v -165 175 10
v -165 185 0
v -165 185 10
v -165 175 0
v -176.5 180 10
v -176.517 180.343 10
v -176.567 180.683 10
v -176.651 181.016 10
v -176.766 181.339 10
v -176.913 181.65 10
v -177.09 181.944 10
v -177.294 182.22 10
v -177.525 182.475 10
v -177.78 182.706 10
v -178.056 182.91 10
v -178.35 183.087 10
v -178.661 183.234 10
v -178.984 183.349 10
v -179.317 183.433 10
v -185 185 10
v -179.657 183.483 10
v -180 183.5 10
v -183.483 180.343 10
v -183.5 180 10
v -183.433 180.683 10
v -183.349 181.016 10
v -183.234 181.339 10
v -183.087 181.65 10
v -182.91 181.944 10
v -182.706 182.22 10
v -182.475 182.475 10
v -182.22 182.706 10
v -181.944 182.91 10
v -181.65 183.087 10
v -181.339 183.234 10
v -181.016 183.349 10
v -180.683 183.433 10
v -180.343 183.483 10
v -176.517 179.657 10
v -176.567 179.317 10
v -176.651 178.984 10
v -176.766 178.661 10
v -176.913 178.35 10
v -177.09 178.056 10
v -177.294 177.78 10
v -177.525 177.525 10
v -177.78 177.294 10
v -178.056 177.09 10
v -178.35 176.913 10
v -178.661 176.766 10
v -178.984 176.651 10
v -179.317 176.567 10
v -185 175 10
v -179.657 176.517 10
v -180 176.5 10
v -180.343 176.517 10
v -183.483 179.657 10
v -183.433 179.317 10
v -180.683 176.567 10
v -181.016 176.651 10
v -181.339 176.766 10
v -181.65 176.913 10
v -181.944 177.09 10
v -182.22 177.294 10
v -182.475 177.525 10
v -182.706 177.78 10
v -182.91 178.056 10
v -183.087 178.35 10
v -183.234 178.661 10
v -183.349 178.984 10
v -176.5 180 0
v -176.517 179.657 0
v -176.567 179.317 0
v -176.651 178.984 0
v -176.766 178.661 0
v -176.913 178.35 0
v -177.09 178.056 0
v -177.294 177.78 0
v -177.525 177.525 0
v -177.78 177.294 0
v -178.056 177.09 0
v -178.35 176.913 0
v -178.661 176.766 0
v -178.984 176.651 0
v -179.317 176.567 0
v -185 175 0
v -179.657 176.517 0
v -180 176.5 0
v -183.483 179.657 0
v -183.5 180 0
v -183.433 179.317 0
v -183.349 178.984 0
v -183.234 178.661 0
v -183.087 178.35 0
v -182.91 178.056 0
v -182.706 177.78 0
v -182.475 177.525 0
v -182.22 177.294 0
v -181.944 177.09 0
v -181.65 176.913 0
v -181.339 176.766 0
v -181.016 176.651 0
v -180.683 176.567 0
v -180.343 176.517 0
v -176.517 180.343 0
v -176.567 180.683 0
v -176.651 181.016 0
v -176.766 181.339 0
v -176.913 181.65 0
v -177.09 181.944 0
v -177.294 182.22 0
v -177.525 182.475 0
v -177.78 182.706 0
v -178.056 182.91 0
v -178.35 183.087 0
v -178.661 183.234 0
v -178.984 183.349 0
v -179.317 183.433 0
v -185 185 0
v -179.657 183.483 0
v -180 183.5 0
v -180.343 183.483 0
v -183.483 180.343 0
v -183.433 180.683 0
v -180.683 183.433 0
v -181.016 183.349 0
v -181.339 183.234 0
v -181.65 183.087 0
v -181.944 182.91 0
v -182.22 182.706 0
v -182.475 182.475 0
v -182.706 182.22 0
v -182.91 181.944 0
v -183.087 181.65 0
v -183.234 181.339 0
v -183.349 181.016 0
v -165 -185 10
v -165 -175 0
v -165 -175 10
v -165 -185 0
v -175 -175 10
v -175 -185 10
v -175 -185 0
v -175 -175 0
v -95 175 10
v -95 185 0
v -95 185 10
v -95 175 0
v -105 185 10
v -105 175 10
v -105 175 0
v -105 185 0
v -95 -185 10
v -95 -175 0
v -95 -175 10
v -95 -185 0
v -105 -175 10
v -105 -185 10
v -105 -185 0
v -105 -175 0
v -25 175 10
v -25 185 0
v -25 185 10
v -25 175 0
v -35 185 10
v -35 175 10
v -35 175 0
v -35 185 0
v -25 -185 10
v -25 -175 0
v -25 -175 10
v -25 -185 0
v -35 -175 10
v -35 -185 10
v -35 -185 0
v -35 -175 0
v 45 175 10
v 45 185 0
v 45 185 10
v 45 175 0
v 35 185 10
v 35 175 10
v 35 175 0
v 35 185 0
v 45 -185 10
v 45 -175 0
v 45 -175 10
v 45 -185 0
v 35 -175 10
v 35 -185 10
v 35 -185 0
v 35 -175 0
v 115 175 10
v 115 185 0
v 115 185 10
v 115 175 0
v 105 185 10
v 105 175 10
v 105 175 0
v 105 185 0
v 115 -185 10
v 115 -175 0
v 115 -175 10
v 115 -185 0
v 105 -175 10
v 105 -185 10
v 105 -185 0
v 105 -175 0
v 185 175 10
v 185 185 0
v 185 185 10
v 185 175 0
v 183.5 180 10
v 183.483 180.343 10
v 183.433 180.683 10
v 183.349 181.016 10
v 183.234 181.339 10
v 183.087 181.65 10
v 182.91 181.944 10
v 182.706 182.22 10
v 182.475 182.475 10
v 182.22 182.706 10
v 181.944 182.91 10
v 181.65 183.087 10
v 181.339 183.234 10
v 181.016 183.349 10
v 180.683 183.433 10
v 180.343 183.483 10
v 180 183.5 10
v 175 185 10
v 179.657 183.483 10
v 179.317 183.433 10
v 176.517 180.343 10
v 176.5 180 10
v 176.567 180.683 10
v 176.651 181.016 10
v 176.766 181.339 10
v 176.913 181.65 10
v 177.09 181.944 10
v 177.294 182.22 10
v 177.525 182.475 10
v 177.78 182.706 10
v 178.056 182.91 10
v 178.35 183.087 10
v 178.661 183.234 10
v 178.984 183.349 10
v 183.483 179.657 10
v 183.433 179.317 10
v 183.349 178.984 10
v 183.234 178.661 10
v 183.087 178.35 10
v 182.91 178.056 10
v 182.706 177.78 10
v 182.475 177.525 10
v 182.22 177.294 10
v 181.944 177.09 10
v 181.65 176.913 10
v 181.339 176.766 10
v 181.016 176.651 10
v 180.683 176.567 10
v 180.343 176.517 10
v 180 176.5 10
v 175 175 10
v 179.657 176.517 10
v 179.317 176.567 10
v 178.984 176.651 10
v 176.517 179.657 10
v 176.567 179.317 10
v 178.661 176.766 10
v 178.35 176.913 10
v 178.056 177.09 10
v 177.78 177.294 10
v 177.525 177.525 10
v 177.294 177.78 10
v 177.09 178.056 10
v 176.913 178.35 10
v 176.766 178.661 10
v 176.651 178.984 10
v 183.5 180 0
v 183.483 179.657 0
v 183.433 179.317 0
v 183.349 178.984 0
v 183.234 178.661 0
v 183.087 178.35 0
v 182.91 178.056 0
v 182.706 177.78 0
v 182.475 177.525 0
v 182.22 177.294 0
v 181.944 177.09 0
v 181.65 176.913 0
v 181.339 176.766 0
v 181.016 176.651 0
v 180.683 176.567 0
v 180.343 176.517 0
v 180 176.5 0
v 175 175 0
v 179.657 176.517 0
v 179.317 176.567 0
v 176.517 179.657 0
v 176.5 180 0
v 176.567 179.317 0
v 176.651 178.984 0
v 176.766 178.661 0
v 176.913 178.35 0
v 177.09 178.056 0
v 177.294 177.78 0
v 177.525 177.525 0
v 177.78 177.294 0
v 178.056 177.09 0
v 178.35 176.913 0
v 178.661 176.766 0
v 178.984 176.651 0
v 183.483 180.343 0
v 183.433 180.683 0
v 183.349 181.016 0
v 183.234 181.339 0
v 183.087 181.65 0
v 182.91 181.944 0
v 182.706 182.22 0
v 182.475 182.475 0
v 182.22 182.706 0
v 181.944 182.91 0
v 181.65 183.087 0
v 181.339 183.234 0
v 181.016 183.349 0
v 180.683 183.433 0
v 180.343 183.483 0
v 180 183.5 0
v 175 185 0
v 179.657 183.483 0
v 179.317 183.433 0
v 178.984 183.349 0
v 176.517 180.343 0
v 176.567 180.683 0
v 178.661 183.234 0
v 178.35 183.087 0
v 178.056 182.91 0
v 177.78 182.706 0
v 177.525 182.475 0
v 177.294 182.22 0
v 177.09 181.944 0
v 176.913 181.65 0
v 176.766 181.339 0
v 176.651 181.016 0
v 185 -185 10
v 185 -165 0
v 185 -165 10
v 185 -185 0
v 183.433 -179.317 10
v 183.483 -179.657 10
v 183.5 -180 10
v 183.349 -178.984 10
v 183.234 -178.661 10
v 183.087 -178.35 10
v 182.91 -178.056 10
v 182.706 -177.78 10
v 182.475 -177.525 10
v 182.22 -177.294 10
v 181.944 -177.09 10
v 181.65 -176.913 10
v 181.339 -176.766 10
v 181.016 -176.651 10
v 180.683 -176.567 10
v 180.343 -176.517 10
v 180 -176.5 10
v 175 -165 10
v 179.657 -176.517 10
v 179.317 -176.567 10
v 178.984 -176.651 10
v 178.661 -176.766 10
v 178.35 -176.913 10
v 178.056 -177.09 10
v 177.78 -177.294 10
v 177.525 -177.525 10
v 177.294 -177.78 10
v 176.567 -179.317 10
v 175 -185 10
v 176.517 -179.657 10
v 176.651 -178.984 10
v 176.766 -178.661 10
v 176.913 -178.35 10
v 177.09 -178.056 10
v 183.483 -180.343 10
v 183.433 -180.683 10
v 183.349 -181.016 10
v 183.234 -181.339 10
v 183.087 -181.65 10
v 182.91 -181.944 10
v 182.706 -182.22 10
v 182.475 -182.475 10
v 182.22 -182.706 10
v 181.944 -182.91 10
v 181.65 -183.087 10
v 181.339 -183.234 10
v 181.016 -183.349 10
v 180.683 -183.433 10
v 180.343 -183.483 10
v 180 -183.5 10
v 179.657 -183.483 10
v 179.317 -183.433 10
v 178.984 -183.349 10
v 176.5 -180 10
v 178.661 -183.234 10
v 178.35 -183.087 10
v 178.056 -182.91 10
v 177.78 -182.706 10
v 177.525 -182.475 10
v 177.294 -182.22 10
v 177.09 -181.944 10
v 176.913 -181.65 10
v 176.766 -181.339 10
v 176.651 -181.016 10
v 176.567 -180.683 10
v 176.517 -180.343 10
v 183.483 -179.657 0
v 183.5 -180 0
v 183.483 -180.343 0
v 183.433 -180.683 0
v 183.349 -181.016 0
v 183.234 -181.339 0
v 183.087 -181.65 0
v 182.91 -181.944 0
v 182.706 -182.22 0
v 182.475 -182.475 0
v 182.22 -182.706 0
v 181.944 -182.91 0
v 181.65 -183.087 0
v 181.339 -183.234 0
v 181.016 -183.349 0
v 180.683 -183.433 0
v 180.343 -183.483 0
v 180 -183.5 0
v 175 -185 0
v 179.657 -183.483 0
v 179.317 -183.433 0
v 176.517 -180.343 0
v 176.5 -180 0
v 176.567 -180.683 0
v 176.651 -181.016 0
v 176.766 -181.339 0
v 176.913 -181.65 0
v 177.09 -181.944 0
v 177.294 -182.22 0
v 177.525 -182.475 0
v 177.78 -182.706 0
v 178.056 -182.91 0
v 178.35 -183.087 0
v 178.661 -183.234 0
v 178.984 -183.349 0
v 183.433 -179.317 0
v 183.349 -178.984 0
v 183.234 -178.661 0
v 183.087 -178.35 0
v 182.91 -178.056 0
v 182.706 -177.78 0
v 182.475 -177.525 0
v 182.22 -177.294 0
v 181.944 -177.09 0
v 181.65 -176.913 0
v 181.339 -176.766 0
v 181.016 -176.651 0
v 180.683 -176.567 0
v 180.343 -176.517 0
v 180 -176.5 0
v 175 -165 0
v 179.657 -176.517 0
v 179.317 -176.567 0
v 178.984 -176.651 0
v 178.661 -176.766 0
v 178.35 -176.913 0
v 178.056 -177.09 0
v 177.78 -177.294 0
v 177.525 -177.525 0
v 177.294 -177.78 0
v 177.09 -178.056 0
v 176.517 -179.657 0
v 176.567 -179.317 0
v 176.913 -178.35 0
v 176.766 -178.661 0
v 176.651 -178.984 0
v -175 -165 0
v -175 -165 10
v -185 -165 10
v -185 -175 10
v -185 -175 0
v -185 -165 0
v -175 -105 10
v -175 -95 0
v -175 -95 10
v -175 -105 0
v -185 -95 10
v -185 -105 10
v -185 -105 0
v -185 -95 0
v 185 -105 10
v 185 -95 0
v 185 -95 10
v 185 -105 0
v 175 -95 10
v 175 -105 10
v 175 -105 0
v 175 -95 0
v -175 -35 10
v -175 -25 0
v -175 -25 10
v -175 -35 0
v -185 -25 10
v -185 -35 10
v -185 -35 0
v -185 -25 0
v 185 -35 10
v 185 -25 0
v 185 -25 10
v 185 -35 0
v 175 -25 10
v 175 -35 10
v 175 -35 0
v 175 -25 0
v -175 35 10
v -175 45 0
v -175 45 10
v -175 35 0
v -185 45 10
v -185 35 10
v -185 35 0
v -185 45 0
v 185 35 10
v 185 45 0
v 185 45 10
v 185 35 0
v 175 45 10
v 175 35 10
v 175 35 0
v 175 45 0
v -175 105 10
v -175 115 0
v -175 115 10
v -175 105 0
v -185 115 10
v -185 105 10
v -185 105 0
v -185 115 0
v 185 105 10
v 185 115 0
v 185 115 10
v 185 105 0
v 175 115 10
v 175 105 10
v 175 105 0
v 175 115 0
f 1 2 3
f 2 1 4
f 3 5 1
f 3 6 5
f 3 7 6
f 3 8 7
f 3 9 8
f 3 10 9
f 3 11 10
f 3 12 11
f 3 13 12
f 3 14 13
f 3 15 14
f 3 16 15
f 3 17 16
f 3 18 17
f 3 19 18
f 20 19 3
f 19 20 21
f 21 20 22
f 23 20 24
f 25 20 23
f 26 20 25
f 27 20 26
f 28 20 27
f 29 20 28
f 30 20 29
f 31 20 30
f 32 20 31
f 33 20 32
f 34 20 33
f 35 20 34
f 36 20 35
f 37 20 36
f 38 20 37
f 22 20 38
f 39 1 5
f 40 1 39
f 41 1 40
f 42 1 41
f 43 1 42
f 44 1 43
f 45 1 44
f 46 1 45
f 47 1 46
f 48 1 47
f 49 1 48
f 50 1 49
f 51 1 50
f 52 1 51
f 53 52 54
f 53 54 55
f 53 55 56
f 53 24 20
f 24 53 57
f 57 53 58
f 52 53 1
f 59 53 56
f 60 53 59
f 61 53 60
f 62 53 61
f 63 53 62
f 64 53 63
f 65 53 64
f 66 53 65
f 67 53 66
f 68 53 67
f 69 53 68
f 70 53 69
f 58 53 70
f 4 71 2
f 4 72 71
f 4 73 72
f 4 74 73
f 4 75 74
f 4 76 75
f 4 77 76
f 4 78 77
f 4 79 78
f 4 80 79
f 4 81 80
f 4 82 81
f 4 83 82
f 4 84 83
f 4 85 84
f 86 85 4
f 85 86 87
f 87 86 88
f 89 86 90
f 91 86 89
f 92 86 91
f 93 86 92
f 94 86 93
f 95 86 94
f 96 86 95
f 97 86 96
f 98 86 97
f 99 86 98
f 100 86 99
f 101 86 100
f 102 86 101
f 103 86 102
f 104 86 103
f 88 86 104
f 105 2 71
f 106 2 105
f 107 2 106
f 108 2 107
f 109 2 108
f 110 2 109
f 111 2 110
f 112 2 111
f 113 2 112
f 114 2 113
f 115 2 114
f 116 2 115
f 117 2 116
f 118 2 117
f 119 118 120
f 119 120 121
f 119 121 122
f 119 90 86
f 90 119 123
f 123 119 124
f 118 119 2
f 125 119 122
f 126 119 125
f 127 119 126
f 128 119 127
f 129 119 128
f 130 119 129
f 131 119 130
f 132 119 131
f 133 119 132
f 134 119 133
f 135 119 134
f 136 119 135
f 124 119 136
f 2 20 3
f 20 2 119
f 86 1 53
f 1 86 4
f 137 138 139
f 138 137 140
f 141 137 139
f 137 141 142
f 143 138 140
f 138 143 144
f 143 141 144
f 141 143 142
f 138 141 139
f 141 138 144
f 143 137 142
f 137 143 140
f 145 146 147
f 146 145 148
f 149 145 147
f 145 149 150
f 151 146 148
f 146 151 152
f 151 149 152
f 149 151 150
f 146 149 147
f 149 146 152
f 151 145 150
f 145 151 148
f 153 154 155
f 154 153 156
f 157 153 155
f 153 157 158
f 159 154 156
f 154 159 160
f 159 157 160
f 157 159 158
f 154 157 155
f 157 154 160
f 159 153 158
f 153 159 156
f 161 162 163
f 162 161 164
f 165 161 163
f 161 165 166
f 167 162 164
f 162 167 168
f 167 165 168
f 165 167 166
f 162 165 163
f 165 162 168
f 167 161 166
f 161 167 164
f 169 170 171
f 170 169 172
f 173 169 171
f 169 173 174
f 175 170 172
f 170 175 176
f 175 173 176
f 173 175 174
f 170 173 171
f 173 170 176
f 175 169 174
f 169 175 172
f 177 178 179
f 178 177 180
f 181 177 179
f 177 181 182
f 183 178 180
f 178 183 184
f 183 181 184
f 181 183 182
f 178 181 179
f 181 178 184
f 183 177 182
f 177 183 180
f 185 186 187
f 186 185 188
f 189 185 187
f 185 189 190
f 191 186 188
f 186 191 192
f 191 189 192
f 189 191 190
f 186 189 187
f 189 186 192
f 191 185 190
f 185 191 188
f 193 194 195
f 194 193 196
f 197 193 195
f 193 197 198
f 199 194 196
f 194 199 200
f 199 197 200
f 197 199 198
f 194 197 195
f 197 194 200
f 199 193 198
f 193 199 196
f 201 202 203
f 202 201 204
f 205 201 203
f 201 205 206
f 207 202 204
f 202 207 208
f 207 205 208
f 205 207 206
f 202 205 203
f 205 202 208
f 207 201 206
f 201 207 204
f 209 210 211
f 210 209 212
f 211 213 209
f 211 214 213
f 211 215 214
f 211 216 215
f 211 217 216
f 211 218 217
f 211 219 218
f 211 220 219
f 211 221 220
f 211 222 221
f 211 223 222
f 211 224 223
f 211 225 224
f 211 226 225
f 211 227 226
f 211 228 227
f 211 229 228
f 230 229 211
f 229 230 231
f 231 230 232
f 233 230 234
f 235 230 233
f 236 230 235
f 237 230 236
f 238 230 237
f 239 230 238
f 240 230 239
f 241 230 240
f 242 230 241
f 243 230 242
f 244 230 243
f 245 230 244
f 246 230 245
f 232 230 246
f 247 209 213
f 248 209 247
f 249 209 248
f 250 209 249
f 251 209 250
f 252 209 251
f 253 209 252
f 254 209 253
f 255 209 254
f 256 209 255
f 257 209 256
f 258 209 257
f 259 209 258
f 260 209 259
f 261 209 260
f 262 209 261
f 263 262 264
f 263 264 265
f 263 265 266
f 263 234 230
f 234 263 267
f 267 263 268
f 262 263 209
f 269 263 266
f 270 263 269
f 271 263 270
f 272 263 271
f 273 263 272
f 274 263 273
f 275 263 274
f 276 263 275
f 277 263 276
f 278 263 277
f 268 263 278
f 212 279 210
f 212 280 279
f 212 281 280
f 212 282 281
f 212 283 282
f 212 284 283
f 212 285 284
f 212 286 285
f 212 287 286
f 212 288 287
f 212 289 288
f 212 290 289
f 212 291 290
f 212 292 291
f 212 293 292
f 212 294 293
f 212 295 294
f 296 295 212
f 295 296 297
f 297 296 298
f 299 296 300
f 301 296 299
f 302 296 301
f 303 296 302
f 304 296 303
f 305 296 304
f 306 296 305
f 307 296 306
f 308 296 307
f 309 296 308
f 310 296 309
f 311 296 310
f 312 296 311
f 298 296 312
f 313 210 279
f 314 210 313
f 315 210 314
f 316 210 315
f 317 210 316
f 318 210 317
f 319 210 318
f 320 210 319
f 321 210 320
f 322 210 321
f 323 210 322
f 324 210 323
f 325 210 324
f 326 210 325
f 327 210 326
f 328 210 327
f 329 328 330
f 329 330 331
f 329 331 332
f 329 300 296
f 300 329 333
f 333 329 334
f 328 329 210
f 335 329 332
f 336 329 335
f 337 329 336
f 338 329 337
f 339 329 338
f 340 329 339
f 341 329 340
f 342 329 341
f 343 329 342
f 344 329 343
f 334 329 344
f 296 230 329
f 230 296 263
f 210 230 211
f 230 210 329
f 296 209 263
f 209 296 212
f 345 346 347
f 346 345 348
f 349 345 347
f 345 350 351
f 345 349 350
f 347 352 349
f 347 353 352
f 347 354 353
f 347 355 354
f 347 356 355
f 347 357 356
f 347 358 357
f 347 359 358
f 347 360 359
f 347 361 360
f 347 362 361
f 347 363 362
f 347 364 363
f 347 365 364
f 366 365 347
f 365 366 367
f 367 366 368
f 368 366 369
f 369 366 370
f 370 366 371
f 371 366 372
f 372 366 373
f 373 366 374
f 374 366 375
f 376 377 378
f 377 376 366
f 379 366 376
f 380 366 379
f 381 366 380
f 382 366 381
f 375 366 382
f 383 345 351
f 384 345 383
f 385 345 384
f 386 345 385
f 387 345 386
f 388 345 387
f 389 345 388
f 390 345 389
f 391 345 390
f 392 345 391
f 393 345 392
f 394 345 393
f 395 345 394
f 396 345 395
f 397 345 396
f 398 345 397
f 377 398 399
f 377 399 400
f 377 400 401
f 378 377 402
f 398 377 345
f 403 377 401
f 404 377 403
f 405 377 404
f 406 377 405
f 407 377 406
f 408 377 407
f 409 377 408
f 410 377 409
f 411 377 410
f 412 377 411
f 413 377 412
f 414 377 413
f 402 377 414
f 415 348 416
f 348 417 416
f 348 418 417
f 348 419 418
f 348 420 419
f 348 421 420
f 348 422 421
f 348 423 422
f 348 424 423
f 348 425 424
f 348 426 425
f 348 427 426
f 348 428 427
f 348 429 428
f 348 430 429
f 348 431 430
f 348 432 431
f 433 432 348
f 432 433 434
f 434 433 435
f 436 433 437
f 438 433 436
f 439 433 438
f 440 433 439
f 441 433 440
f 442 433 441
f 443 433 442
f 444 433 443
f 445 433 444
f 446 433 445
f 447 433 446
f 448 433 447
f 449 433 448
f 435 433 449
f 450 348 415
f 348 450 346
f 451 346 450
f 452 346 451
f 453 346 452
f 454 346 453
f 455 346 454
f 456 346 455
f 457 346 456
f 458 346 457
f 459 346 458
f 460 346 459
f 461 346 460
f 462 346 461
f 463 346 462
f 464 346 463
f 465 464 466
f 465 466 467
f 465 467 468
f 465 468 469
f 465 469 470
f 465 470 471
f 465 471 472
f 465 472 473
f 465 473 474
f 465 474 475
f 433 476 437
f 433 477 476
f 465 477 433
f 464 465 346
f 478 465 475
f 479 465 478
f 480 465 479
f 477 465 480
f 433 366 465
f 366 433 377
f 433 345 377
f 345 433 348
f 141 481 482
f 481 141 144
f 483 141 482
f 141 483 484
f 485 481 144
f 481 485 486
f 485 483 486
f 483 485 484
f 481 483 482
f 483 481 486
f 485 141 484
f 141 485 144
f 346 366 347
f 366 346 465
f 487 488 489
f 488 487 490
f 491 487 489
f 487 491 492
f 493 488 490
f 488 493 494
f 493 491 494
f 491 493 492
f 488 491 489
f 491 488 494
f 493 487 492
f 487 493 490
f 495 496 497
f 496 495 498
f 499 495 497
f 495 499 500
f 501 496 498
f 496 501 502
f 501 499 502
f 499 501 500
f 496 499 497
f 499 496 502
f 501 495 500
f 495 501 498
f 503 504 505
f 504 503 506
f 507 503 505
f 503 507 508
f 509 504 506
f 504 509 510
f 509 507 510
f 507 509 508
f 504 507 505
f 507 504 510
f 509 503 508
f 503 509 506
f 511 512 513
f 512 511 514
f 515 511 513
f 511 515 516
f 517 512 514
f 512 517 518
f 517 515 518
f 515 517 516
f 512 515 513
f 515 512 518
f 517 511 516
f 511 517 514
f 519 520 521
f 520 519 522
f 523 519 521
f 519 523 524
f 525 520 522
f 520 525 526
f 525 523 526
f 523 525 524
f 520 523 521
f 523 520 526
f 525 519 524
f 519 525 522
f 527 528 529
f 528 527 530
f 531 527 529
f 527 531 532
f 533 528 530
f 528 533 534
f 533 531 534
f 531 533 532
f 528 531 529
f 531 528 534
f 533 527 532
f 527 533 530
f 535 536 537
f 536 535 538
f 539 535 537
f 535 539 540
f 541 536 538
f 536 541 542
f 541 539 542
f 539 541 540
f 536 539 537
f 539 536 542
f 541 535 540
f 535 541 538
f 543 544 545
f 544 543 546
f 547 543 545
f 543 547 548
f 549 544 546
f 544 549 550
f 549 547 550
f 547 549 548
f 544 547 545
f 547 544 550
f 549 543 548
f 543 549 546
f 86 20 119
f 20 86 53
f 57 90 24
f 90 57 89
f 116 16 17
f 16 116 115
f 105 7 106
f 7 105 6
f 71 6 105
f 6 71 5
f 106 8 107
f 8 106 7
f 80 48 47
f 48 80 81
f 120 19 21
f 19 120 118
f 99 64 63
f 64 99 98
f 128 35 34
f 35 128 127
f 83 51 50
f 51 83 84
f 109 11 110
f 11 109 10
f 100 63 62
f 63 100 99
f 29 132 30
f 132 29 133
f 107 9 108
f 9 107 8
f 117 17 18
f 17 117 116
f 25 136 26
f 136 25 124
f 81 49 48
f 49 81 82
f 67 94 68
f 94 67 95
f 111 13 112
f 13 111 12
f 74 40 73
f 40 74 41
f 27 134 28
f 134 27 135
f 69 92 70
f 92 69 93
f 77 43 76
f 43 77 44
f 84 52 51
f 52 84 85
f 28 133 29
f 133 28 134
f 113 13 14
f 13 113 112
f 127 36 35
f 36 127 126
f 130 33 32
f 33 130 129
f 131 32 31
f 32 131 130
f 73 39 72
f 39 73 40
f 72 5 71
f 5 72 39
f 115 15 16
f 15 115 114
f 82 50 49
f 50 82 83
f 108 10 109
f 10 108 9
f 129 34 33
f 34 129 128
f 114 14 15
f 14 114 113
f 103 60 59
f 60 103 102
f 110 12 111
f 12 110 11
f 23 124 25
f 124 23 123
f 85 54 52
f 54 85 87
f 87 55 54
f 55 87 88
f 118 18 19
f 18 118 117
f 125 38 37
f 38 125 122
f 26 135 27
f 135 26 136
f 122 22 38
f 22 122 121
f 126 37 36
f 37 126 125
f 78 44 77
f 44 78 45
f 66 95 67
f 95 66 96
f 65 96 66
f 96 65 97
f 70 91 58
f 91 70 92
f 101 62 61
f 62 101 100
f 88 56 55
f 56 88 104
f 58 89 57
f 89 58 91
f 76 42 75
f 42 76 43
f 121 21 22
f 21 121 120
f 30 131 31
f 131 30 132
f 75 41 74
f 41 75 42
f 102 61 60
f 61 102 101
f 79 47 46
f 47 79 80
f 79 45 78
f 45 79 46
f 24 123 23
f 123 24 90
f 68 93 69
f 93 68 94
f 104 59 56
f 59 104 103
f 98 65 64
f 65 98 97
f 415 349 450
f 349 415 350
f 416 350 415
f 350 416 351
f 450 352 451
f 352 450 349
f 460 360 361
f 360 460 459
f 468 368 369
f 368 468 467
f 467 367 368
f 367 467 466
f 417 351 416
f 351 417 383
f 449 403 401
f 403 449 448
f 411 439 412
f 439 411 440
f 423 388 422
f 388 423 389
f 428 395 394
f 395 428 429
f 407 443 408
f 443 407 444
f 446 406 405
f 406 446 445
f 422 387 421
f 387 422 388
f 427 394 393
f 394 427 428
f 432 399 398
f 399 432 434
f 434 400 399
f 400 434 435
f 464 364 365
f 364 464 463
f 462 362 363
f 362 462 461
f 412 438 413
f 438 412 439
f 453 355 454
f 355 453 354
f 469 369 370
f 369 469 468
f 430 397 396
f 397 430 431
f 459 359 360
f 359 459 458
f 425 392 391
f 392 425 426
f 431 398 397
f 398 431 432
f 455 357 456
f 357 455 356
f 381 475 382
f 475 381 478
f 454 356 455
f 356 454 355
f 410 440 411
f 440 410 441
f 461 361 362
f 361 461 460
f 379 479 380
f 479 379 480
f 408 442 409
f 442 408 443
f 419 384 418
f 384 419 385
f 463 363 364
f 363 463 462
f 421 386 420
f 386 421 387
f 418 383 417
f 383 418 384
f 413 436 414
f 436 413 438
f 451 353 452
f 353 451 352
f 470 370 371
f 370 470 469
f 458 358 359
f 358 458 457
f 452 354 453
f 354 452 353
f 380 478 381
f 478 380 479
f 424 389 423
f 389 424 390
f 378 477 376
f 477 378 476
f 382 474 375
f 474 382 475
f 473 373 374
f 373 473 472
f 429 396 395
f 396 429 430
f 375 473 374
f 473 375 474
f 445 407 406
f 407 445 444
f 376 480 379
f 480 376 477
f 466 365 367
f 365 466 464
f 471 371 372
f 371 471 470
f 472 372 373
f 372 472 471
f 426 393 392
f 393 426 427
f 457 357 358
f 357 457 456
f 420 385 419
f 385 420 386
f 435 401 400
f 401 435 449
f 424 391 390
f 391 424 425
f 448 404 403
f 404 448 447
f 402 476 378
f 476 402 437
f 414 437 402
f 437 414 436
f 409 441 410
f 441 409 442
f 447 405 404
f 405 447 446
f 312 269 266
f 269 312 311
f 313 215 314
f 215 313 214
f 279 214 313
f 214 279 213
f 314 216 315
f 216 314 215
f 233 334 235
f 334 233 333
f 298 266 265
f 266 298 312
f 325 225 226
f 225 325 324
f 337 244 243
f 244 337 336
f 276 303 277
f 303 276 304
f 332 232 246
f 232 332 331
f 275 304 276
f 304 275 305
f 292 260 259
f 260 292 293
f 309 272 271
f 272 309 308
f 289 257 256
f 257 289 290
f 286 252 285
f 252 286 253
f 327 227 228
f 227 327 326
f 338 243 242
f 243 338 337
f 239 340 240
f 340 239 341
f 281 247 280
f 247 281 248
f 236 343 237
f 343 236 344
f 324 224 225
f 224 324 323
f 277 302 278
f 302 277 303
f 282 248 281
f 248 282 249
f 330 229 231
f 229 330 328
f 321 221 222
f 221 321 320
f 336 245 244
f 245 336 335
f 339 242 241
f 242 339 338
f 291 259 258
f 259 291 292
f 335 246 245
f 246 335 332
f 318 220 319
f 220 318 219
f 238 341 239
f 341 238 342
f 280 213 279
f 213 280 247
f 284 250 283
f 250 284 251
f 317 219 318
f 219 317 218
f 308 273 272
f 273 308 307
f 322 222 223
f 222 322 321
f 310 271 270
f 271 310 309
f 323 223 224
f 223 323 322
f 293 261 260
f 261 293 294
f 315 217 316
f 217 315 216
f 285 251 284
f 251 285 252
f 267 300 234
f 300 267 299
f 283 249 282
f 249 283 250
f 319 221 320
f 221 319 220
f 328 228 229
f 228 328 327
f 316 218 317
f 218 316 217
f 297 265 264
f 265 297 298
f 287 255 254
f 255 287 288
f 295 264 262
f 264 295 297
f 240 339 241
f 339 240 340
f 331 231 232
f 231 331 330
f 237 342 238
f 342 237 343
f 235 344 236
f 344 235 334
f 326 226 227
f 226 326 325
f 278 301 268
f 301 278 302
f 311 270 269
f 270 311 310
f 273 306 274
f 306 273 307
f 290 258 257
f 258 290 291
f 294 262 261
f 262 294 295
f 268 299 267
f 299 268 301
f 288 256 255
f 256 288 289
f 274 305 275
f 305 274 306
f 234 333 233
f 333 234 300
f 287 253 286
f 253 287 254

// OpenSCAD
// ring_01.scad - ring index 1 (z bottom = 10 mm)
$fn = 64;
bar = 10; half_b = bar/2; outer = 370; half_outer = outer/2;
front_y = 180; back_y = -180; left_x = -180; right_x = 180;
x_centers = [-170, -100, -30, 40, 110, 180];
z_centers = [5, 85, 155, 225, 295, 365, 435, 505, 575, 645, 715];
ring_z = 10;
module place_box(cx, cy, sx, sy) { translate([cx - sx/2, cy - sy/2, 0]) cube([sx, sy, bar]); }

difference() { union() {
    for (x = x_centers) { place_box(x, front_y, bar, bar); place_box(x, back_y, bar, bar); }
    for (y = x_centers) { place_box(left_x, y, bar, bar); place_box(right_x, y, bar, bar); }
    for (zc = z_centers) if ((zc - half_b < ring_z + bar) && (zc + half_b > ring_z)) {
        translate([-half_outer, front_y - half_b, 0]) cube([outer, bar, bar]);
        translate([-half_outer, back_y - half_b, 0])  cube([outer, bar, bar]);
        translate([left_x - half_b, -half_outer, 0])  cube([bar, outer, bar]);
        translate([right_x - half_b, -half_outer, 0]) cube([bar, outer, bar]);
    }
  }
  for (cx = [-180, 180]) for (cy = [-180, 180]) translate([cx, cy, 0]) cylinder(h = bar, r = 3.5, $fn = 64);
}
